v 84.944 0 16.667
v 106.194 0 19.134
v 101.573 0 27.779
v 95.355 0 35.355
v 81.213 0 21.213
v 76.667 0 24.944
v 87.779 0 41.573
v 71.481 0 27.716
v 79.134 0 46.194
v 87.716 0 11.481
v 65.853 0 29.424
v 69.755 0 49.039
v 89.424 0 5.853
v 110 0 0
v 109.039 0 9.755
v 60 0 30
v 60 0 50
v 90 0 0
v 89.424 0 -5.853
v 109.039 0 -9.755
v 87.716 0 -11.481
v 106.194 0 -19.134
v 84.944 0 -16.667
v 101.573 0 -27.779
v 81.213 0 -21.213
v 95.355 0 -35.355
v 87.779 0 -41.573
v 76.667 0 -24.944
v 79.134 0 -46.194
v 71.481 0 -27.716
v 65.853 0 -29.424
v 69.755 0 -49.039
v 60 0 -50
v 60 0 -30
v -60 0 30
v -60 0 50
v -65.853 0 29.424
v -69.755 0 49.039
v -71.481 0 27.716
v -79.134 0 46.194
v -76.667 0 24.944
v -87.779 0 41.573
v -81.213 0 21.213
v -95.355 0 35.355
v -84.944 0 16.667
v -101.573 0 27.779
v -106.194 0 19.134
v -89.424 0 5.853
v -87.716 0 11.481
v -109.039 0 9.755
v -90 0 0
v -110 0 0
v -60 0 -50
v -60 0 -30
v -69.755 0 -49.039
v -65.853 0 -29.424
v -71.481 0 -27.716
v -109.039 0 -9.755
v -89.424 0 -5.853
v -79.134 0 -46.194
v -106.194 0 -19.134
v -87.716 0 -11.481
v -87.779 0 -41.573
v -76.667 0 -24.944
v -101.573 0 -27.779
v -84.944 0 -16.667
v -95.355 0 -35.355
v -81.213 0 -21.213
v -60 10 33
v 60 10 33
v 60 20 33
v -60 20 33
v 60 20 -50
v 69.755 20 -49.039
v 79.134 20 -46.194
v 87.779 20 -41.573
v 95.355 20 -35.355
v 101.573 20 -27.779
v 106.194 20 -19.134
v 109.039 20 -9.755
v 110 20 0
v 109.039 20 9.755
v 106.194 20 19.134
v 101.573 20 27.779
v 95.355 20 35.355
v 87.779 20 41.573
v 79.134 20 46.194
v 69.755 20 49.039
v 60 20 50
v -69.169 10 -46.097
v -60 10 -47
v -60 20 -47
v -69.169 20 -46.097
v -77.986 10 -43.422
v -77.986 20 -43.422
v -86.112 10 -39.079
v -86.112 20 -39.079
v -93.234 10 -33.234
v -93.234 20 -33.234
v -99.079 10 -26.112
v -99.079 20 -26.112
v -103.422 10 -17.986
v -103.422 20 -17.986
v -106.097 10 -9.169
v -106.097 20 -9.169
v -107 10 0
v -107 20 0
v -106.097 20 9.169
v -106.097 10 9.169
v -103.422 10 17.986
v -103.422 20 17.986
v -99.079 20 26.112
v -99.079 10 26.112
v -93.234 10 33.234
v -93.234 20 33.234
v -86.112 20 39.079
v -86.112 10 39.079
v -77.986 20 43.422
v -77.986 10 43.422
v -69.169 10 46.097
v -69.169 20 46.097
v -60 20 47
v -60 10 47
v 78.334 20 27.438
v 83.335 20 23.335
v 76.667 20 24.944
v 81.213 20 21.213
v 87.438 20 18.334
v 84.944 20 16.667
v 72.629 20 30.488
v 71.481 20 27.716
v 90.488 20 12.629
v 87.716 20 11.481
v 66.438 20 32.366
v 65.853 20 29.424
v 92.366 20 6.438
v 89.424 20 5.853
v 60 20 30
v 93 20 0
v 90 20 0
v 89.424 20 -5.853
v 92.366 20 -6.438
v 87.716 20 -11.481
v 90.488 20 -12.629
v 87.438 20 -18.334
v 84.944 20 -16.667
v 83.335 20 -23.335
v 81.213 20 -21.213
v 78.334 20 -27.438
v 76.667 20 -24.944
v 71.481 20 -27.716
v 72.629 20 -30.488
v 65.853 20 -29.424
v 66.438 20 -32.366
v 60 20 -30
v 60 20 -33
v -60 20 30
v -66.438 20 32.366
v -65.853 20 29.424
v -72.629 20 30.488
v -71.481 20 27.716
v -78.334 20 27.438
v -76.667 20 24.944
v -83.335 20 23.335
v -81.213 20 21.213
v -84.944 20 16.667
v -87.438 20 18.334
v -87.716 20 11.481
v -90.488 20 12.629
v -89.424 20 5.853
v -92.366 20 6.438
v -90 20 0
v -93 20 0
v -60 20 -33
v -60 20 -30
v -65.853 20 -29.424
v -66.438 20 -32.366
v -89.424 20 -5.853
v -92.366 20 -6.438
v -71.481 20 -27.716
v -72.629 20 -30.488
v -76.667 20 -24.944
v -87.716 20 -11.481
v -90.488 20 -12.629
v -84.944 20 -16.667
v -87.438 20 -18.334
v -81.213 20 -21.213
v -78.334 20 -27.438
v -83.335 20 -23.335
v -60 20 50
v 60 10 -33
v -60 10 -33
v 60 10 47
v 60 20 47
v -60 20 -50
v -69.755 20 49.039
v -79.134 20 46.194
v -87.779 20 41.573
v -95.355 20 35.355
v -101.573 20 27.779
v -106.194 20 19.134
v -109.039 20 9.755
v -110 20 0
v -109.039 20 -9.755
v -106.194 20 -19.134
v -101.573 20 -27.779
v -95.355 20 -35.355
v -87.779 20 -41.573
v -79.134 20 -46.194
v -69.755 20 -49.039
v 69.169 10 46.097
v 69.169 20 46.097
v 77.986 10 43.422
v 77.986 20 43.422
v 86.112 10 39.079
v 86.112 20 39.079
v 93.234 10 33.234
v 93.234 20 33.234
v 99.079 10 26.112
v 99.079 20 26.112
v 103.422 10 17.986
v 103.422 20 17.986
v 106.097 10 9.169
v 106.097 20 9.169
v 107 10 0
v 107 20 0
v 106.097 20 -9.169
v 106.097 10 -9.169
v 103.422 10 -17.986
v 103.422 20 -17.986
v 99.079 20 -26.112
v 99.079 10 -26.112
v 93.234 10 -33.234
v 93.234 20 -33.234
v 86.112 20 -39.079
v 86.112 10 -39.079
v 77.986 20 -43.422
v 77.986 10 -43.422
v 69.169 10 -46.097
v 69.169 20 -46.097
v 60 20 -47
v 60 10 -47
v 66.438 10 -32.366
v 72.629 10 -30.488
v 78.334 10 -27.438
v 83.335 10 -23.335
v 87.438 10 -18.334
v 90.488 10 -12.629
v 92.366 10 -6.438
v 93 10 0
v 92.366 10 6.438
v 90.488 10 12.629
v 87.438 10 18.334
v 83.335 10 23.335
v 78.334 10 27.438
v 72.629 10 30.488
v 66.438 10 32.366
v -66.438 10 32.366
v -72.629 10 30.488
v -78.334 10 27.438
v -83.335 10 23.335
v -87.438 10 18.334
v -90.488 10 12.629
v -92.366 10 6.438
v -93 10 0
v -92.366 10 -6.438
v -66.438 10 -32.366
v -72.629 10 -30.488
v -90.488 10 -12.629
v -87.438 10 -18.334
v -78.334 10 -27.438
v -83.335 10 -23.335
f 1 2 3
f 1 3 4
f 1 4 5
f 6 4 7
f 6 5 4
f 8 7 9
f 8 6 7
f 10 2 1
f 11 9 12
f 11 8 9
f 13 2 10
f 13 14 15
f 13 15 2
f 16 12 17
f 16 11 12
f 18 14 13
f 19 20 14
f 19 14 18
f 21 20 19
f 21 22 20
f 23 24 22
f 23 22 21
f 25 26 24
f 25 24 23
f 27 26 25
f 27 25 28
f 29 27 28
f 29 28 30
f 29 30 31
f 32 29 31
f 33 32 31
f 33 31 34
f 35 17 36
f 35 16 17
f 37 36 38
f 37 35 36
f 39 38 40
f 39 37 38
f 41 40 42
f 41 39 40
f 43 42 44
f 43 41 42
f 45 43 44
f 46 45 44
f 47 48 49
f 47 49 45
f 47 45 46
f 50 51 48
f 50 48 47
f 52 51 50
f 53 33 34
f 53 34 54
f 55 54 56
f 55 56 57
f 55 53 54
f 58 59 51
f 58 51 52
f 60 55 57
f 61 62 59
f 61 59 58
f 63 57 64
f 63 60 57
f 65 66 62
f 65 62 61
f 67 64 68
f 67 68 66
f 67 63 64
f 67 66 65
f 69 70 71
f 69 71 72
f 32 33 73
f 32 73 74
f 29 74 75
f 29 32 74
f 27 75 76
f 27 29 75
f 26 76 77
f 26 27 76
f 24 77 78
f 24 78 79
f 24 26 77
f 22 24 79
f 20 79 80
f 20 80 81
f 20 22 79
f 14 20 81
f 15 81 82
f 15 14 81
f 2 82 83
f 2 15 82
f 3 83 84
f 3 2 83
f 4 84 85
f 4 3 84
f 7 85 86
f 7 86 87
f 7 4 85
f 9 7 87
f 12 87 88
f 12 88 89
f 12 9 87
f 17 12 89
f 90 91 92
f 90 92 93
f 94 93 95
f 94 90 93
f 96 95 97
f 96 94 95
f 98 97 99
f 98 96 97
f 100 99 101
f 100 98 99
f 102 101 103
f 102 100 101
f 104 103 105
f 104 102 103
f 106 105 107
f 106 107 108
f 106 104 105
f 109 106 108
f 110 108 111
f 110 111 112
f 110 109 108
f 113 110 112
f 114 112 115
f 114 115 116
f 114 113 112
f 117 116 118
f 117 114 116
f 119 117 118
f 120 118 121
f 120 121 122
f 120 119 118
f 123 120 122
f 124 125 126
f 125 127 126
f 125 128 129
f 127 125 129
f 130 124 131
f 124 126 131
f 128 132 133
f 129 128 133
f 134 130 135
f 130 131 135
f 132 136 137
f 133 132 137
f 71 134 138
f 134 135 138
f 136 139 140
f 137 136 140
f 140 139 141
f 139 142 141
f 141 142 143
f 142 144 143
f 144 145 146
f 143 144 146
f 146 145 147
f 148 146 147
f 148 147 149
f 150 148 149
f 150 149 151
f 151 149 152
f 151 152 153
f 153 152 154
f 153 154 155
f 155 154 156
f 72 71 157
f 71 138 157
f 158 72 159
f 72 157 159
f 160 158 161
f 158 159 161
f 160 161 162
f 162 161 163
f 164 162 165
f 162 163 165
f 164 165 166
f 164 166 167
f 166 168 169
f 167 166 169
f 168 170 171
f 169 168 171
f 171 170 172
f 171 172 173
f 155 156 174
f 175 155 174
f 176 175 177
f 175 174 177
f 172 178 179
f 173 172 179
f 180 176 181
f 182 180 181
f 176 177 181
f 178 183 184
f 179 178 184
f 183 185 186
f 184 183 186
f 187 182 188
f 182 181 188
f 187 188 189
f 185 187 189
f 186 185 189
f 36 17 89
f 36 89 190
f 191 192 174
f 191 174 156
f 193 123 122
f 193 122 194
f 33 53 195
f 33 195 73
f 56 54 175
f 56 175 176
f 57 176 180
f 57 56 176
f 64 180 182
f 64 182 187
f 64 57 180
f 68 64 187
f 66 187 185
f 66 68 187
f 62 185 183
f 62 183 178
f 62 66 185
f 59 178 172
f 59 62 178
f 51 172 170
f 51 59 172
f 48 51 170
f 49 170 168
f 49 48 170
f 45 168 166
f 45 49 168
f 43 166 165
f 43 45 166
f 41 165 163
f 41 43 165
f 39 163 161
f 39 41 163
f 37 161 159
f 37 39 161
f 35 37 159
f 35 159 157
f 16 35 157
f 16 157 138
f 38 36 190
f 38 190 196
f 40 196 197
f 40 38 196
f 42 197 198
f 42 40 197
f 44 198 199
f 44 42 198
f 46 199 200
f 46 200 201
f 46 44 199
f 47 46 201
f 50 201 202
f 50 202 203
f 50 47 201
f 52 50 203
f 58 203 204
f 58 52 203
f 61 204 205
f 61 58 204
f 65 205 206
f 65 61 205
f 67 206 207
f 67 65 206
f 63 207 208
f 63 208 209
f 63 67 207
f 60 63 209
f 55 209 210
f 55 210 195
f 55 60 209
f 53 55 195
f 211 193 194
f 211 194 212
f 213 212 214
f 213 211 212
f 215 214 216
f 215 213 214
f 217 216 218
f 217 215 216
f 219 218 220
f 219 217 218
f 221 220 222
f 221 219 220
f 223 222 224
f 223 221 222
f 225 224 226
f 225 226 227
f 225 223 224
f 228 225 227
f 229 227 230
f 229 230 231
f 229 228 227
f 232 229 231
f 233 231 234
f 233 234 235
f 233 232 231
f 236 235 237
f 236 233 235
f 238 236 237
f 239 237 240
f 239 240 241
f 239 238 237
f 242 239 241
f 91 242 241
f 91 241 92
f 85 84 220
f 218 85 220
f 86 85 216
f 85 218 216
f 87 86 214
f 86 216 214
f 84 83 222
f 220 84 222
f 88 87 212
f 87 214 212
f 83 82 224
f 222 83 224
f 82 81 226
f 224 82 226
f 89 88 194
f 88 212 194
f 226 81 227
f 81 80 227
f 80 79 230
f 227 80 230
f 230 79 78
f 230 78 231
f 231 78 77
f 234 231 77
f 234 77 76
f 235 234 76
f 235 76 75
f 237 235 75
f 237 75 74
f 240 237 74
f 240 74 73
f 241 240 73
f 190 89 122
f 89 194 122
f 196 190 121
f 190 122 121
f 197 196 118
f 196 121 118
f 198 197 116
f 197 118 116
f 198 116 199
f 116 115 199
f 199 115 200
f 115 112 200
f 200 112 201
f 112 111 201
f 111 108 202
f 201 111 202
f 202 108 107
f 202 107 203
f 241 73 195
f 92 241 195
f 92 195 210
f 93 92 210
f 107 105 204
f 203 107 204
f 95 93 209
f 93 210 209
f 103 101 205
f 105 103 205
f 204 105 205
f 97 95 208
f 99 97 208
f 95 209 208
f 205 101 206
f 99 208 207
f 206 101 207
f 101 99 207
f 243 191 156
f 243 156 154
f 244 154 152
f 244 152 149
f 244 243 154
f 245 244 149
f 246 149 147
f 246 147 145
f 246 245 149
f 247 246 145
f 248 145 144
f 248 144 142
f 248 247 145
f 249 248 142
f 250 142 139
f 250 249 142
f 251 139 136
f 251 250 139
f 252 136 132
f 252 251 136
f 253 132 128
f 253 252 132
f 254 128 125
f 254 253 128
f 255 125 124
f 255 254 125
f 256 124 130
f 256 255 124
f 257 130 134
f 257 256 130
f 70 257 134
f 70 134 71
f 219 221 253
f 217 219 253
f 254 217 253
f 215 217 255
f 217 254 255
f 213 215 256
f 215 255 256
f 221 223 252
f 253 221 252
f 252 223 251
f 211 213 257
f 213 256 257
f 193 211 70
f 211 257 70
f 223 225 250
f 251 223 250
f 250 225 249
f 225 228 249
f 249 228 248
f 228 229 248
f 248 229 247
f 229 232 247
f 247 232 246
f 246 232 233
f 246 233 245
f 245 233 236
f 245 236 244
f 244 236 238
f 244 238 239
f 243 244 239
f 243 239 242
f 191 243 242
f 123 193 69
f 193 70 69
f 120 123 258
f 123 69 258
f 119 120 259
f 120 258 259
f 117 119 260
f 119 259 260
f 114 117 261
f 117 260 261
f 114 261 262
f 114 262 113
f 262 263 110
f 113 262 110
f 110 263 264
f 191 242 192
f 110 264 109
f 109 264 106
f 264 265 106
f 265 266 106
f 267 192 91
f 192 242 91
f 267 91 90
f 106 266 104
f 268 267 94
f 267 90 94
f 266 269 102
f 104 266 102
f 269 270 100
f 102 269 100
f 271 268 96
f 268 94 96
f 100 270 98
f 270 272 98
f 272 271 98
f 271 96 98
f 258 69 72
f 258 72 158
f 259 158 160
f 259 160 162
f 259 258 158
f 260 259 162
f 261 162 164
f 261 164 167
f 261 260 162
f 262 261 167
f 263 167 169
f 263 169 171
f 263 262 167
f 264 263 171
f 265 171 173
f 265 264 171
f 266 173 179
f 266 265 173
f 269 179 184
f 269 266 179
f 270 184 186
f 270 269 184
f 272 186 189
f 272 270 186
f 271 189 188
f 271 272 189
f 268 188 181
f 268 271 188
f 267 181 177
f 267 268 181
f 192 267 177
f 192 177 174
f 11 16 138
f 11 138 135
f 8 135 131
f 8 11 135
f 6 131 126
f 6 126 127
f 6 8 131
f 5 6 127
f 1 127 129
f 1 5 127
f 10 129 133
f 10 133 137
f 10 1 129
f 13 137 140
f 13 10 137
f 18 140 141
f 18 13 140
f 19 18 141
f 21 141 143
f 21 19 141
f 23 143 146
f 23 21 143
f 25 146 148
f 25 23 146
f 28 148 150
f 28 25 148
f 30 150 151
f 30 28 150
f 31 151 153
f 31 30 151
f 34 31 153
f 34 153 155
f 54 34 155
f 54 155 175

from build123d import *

# Parameters (mm, degrees)
EXTRUDE_3_DEPTH = 10
EXTRUDE_4_DEPTH = 20


with BuildPart() as part:
    # 草圖1 → 填料-伸長3 (new body)
    with BuildSketch(Plane(origin=(0, 0, 0), x_dir=(1, 0, 0), z_dir=(0, 1, 0))):
        with BuildLine():
            Line((-60, 50), (60, 50))
            ThreePointArc((60, 50), (110, 0), (60, -50))
            Line((60, -50), (-60, -50))
            ThreePointArc((-60, -50), (-110, 0), (-60, 50))
        make_face()
        with BuildLine():
            Line((-60, -30), (60, -30))
            ThreePointArc((60, -30), (90, 0), (60, 30))
            Line((60, 30), (-60, 30))
            ThreePointArc((-60, 30), (-90, 0), (-60, -30))
        make_face(mode=Mode.SUBTRACT)
    extrude(amount=EXTRUDE_3_DEPTH)

    # 草圖4 → 填料-伸長4 (add)
    # profile 1 of 2: a face of its own
    with BuildSketch(Plane(origin=(0, 0, 0), x_dir=(1, 0, 0), z_dir=(0, 1, 0))):
        with BuildLine():
            Line((-60, 50), (60, 50))
            ThreePointArc((60, 50), (110, 0), (60, -50))
            Line((60, -50), (-60, -50))
            ThreePointArc((-60, -50), (-110, 0), (-60, 50))
        make_face()
        with BuildLine():
            ThreePointArc((60, -47), (107, 0), (60, 47))
            Line((60, 47), (-60, 47))
            ThreePointArc((-60, 47), (-107, 0), (-60, -47))
            Line((-60, -47), (60, -47))
        make_face(mode=Mode.SUBTRACT)
    # profile 2 of 2: a face of its own
    with BuildSketch(Plane(origin=(0, 0, 0), x_dir=(1, 0, 0), z_dir=(0, 1, 0))):
        with BuildLine():
            Line((-60, 33), (60, 33))
            ThreePointArc((60, 33), (93, 0), (60, -33))
            Line((60, -33), (-60, -33))
            ThreePointArc((-60, -33), (-93, 0), (-60, 33))
        make_face()
        with BuildLine():
            ThreePointArc((-60, 30), (-90, 0), (-60, -30))
            Line((-60, -30), (60, -30))
            ThreePointArc((60, -30), (90, 0), (60, 30))
            Line((60, 30), (-60, 30))
        make_face(mode=Mode.SUBTRACT)
    extrude(amount=EXTRUDE_4_DEPTH)


solid = part.part
